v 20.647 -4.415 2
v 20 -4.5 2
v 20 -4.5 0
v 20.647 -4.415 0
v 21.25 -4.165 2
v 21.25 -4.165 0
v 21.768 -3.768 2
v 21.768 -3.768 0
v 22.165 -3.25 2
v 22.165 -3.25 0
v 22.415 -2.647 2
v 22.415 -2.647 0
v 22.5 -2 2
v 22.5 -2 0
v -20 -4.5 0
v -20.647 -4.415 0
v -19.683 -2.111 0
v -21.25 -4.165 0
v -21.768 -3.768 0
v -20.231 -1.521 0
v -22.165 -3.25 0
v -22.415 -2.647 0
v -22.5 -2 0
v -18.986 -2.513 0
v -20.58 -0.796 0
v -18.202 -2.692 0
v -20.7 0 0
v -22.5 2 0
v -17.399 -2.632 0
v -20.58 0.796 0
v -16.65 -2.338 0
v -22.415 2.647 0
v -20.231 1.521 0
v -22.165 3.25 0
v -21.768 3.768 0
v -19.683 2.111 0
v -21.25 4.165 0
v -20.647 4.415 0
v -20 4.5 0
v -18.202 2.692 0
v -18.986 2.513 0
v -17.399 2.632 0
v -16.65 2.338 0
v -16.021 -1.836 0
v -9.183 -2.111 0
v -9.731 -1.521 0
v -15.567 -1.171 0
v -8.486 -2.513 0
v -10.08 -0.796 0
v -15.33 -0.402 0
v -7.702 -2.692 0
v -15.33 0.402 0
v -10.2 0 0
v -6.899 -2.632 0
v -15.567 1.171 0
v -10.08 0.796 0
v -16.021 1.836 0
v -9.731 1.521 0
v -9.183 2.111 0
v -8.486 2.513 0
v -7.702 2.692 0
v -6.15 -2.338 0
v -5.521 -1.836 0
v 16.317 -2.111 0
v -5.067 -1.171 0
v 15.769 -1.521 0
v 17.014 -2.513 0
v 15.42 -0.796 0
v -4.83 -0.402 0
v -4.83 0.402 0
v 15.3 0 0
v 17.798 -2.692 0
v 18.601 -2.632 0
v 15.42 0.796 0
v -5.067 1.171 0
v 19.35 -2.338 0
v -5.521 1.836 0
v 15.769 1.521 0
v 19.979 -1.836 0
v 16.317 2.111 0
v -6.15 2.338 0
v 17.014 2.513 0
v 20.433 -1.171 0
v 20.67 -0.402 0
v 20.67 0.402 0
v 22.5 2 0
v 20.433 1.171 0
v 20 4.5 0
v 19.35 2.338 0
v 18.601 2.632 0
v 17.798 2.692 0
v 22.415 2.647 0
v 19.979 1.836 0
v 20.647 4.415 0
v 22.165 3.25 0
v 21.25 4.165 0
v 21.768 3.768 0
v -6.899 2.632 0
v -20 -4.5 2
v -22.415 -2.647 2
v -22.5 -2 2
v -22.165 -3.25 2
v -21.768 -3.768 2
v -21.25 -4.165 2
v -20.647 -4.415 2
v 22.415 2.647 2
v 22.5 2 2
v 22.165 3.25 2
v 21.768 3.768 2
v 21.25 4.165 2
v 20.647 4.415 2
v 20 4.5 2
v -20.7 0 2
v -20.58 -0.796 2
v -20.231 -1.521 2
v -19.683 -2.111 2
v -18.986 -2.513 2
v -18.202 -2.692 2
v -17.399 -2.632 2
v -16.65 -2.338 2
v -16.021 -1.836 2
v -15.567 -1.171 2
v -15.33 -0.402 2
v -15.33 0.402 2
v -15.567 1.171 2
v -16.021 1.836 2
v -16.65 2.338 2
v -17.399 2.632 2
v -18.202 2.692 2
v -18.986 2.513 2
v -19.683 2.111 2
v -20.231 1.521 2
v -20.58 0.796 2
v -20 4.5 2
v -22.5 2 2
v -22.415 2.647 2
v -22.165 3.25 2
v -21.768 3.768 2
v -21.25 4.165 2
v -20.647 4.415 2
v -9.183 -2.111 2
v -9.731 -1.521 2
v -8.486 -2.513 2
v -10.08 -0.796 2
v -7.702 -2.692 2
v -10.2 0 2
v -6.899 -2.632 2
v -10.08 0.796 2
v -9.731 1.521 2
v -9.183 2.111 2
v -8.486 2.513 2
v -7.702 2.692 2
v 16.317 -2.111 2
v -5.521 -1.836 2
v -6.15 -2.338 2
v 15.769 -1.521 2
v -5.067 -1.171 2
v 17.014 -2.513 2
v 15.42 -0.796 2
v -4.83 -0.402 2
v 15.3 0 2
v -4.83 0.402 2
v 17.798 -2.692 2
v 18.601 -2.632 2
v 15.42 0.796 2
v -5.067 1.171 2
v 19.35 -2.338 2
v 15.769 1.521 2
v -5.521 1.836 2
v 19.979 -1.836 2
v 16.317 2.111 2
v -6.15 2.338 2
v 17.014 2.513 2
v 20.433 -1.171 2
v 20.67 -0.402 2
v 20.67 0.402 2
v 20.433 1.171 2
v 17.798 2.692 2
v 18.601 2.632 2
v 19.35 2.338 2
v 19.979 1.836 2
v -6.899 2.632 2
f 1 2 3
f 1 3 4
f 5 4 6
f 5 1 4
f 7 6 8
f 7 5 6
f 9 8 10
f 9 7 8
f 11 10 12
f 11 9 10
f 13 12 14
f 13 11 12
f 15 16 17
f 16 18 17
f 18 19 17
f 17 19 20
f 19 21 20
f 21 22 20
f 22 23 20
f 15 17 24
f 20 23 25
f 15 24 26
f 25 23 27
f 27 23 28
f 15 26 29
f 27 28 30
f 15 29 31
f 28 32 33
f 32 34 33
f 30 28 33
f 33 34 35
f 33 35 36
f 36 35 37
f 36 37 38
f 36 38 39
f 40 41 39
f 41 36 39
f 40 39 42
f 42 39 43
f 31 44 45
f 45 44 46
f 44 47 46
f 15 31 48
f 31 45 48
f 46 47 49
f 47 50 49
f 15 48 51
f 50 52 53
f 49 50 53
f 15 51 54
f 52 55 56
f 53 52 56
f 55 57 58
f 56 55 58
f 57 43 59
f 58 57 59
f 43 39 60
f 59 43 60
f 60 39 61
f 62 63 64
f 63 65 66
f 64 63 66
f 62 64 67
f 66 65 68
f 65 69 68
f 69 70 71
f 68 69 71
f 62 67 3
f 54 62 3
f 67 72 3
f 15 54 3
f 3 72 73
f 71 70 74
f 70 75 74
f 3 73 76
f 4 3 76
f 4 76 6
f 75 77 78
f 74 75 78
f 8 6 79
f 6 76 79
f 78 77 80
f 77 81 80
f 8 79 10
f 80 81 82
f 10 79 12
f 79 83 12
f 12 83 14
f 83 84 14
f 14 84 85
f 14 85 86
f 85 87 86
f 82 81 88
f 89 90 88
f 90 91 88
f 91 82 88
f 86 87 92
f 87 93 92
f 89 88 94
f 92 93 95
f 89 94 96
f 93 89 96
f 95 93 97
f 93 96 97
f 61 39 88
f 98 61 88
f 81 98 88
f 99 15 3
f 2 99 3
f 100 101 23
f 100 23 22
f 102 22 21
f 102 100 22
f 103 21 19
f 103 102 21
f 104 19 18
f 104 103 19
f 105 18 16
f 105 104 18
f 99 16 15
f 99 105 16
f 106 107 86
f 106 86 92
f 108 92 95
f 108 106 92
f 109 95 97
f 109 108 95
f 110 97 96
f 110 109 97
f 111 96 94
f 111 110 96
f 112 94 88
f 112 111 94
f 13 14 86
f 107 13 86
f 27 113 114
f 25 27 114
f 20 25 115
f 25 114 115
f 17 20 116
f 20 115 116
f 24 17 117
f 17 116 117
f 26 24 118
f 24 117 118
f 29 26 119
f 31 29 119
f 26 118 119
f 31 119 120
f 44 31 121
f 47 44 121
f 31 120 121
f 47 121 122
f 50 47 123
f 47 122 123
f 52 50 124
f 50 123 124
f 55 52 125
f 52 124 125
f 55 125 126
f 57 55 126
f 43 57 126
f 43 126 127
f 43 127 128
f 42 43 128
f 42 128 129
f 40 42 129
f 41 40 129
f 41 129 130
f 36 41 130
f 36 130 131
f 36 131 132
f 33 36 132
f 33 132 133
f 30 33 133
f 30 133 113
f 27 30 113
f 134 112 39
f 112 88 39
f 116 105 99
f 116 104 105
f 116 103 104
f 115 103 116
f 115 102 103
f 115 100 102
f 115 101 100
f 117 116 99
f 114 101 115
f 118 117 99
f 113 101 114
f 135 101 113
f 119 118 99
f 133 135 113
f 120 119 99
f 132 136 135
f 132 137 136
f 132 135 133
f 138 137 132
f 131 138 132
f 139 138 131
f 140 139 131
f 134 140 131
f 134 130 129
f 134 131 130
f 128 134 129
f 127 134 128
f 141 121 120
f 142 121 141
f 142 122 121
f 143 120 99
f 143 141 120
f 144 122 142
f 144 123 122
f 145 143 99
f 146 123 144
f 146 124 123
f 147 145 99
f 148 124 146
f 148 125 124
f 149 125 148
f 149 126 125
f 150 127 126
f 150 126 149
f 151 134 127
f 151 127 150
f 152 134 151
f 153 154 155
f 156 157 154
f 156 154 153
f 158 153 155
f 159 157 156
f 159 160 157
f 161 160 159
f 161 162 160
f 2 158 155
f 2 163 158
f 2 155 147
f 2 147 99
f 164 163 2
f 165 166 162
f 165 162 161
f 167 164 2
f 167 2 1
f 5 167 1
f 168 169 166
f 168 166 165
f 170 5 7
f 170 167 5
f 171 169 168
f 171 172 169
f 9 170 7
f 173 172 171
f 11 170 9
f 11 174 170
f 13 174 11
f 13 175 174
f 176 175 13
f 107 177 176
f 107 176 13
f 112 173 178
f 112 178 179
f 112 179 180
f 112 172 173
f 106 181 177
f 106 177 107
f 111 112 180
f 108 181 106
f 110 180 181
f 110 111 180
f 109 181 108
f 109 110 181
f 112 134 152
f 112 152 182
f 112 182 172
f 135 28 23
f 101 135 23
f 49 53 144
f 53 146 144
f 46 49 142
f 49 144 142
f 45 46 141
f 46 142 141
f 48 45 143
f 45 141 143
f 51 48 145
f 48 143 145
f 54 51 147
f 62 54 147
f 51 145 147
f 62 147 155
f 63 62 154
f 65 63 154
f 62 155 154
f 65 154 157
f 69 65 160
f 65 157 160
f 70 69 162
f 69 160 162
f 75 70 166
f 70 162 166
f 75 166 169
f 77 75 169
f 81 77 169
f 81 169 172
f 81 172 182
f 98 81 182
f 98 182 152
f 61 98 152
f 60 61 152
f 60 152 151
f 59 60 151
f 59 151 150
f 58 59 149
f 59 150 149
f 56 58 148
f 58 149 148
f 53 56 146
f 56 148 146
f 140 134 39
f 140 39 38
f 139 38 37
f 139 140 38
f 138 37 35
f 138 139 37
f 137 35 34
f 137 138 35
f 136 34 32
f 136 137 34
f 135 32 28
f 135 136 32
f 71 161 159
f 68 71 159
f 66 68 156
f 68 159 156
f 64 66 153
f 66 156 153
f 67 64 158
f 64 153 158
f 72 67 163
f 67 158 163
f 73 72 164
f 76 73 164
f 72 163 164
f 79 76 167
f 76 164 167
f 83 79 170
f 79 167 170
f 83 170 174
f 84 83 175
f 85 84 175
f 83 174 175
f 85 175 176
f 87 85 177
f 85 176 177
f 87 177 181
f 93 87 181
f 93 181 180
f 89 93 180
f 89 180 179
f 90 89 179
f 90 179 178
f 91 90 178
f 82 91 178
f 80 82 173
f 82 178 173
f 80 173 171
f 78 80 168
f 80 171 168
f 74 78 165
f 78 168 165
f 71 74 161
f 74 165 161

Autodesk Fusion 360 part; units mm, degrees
sketch "Sketch1" plane through (0, 0, 0) normal (0, 0, 1) x (1, 0, 0)
  line L0 (22.5, 4.5) -> (-22.5, 4.5)
  line L1 (-22.5, 4.5) -> (-22.5, -4.5)
  line L2 (-22.5, -4.5) -> (22.5, -4.5)
  line L3 (22.5, -4.5) -> (22.5, 4.5)
  line L4 (22.5, 4.5) -> (-22.5, -4.5) construction
  line L5 (-22.5, 4.5) -> (22.5, -4.5) construction
  dimension "d1" = 45
  dimension "d2" = 9
extrude "Extrude1" add sketch "Sketch1" along normal blind 2
fillet "Fillet1" radius 2.5 4 edges at (-22.5, 4.5, 1) (-22.5, -4.5, 1) (22.5, -4.5, 1) (22.5, 4.5, 1)
sketch "Sketch2" plane through (0, 0, 2) normal (0, 0, 1) x (-1, 0, 0)
  arc A0 (-22.5, -2) -> (-20, -4.5) centre (-20, -2) ccw
  line L0 (-20, -4.5) -> (20, -4.5)
  arc A1 (22.5, 2) -> (20, 4.5) centre (20, 2) ccw
  line L1 (20, 4.5) -> (-20, 4.5)
  arc A2 (20, -4.5) -> (22.5, -2) centre (20, -2) ccw
  line L2 (22.5, -2) -> (22.5, 2)
  arc A3 (-20, 4.5) -> (-22.5, 2) centre (-20, 2) ccw
  line L3 (-22.5, 2) -> (-22.5, -2)
  line L4 (22.5, 0) -> (-22.5, 0) construction
  line L5 (22.5, 0) -> (18, 0)
  line L6 (-22.5, 0) -> (-18, 0)
  circle A4 centre (18, 0) radius 2.7
  circle A5 centre (-18, 0) radius 2.7
  dimension "d15" = 4.5
  dimension "d16" = 4.5
  dimension "d17" = 5.4
  dimension "d18" = 5.4
extrude "Extrude2" cut sketch "Sketch2" against normal blind 3 contours A4 | A5
sketch "Sketch3" plane through (0, 0, 2) normal (0, 0, 1) x (-1, 0, 0)
  arc A0 (-22.5, -2) -> (-20, -4.5) centre (-20, -2) ccw
  line L0 (-20, -4.5) -> (20, -4.5)
  arc A1 (22.5, 2) -> (20, 4.5) centre (20, 2) ccw
  line L1 (20, 4.5) -> (-20, 4.5)
  arc A2 (20, -4.5) -> (22.5, -2) centre (20, -2) ccw
  line L2 (22.5, -2) -> (22.5, 2)
  arc A3 (-20, 4.5) -> (-22.5, 2) centre (-20, 2) ccw
  line L3 (-22.5, 2) -> (-22.5, -2)
  circle A4 centre (18, 0) radius 2.7
  circle A5 centre (-18, 0) radius 2.7
  line L4 (22.5, 0) -> (-22.5, 0) construction
  line L5 (22.5, 0) -> (7.5, 0)
  circle A6 centre (7.5, 0) radius 2.7
  dimension "d19" = 15
  dimension "d20" = 5.4
extrude "Extrude3" cut sketch "Sketch3" against normal blind 2 contours A6
